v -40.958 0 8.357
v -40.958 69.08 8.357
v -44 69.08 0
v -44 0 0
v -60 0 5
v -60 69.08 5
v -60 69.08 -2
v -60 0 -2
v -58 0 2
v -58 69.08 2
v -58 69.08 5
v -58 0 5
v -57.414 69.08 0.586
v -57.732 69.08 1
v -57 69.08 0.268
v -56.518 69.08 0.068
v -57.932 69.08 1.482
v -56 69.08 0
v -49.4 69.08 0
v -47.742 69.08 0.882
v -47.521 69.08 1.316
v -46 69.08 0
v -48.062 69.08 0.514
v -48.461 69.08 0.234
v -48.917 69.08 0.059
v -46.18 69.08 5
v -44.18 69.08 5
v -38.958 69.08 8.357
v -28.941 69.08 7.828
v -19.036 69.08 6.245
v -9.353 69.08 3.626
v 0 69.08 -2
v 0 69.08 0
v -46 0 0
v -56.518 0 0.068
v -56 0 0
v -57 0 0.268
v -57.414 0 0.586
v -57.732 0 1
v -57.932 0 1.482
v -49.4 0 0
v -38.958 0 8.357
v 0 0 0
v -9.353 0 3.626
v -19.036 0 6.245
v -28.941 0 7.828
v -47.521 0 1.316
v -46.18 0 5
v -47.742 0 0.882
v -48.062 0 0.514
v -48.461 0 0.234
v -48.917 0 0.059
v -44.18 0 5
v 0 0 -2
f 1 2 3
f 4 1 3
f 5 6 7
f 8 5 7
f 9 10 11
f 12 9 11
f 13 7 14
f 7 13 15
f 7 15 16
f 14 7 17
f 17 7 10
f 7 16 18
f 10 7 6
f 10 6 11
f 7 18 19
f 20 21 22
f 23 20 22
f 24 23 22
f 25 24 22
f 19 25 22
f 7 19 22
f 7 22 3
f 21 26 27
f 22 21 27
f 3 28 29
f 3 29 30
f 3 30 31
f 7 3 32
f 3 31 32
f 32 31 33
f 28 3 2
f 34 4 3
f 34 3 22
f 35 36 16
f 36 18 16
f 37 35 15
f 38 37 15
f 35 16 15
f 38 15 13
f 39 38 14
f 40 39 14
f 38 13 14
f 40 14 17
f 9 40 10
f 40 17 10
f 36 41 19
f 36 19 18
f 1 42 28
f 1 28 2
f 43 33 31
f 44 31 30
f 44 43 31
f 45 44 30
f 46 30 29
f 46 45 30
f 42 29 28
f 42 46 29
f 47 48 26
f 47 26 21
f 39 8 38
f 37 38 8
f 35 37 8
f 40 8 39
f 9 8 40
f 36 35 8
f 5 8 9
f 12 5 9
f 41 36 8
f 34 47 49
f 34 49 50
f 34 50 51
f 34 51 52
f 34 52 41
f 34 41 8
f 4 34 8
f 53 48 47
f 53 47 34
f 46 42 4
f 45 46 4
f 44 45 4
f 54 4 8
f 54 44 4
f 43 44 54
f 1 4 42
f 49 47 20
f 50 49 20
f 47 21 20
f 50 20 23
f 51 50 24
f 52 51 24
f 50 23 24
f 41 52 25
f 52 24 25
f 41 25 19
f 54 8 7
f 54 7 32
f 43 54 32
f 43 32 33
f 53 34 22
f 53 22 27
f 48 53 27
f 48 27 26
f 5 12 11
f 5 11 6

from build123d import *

# Parameters (mm, degrees)
F1_DEPTH = 69.07994
F2_R     = 2
F3_R     = 2


with BuildPart() as f1:
    # F0 (on Front) → F1 (new body)
    with BuildSketch(Plane.XZ):
        with BuildLine():
            Line((0, -2), (0, 0))
            ThreePointArc((0, 0), (-19.035896, 6.244577), (-38.958142, 8.357436))
            Line((-38.958142, 8.357436), (-40.958142, 8.357436))
            Line((-40.958142, 8.357436), (-44, 0))
            Line((-44, 0), (-46, 0))
            Line((-46, 0), (-44.180149, 5))
            Line((-44.180149, 5), (-46.180149, 5))
            Line((-46.180149, 5), (-48, 0))
            Line((-48, 0), (-58, 0))
            Line((-58, 0), (-58, 5))
            Line((-58, 5), (-60, 5))
            Line((-60, 5), (-60, -2))
            Line((-60, -2), (0, -2))
        make_face()
    extrude(amount=-F1_DEPTH)

    # F2
    f2_edges = [f1.edges().sort_by_distance(p)[0] for p in [
        (-48, 34.53997, 0),
    ]]
    fillet(f2_edges, radius=F2_R)

    # F3
    f3_edges = [f1.edges().sort_by_distance(p)[0] for p in [
        (-58, 34.53997, 0),
    ]]
    fillet(f3_edges, radius=F3_R)


solid = f1.part
